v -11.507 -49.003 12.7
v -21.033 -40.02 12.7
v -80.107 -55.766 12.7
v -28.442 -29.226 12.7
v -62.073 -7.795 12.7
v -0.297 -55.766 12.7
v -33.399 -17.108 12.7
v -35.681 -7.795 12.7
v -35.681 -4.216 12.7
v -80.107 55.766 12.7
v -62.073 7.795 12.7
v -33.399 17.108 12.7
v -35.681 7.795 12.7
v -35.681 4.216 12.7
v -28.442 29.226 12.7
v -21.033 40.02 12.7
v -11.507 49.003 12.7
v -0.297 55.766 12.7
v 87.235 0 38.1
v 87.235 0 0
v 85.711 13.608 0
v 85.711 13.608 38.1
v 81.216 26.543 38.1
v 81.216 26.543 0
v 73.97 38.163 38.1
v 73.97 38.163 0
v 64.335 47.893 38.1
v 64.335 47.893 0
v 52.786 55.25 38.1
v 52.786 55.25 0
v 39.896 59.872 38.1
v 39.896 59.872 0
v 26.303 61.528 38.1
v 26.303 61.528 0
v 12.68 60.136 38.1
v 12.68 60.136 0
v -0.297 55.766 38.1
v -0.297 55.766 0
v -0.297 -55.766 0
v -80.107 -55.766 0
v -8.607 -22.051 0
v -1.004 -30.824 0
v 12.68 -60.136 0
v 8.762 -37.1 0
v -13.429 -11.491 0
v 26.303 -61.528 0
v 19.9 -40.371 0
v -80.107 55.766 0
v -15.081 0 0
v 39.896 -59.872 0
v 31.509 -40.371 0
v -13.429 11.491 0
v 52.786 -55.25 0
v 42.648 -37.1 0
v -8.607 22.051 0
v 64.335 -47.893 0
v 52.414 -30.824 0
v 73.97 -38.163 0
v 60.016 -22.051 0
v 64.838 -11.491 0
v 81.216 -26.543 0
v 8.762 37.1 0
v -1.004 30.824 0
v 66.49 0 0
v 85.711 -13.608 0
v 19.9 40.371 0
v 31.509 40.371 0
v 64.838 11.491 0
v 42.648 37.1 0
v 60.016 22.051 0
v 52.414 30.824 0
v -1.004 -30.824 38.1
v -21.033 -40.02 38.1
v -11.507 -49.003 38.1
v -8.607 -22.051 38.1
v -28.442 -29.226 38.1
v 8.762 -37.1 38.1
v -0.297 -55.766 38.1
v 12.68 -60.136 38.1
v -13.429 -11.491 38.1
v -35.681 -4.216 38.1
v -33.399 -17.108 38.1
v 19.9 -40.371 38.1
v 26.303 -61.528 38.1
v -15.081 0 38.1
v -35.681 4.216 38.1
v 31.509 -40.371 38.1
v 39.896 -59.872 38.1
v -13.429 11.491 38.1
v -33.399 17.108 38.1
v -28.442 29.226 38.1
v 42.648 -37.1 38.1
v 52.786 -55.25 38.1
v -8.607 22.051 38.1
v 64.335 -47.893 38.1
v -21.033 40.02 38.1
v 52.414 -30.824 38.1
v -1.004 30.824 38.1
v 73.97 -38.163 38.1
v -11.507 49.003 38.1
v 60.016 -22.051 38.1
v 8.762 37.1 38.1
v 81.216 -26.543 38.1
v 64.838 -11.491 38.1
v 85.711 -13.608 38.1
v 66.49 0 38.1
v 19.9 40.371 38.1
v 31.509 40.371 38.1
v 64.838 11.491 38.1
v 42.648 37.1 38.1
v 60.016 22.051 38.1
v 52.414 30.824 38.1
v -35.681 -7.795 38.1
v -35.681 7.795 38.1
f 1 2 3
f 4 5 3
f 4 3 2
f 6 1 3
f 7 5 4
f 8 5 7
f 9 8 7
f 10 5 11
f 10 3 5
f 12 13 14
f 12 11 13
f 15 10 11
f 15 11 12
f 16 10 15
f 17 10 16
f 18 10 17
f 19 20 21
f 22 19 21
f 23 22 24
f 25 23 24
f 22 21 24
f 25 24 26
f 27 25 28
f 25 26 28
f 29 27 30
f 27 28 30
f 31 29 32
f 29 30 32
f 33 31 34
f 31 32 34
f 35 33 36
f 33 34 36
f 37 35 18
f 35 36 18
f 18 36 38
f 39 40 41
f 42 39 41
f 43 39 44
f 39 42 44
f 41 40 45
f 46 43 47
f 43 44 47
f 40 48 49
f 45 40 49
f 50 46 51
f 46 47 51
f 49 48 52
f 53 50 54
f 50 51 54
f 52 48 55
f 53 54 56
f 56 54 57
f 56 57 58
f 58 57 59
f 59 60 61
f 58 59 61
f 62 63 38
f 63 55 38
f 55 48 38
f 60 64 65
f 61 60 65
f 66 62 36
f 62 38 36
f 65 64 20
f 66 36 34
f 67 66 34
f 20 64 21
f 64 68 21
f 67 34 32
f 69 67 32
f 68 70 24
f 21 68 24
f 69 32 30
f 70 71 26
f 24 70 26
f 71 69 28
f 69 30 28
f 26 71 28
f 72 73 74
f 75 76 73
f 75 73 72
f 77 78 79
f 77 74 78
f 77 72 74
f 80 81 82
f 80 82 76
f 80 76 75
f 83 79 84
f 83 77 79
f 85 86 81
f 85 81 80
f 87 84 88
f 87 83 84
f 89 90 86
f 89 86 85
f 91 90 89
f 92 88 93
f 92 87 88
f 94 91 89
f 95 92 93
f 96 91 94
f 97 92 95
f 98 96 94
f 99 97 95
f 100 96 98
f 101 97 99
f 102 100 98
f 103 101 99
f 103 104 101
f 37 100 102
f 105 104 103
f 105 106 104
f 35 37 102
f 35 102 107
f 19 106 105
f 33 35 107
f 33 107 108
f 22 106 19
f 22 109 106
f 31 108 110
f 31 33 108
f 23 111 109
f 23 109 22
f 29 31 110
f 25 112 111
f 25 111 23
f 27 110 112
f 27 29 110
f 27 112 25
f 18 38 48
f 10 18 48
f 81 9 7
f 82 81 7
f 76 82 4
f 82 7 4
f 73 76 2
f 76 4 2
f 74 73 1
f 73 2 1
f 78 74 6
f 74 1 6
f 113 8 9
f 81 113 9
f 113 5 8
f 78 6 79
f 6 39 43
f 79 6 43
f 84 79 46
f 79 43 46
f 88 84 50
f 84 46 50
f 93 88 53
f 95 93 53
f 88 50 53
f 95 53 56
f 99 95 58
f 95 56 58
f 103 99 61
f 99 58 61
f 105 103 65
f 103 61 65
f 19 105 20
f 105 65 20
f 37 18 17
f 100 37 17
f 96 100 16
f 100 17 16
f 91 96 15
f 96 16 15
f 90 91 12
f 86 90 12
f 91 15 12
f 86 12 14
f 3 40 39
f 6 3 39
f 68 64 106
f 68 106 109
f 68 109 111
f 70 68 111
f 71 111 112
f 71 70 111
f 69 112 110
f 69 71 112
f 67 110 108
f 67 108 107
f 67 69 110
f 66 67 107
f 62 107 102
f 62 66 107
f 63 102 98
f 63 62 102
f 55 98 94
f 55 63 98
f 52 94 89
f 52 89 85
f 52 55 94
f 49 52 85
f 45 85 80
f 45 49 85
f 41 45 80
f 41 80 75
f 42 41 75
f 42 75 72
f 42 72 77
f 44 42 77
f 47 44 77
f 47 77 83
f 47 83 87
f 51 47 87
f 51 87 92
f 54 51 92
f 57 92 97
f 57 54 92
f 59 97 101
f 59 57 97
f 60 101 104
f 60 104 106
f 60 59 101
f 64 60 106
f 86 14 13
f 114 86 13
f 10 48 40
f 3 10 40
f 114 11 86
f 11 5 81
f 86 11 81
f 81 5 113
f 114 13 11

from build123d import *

# Parameters (mm, degrees)
F1_DEPTH = 12.7
F0_R     = 40.785869
F2_DEPTH = 38.1
F4_DEPTH = 25.4
F6_DEPTH = 69.326828


with BuildPart() as f1:
    # F0 (on Top) → F1 (new body)
    with BuildSketch(Plane.XY):
        with BuildLine():
            Line((-0.29745, 55.766355), (-80.107197, 55.766355))
            Line((-80.107197, 55.766355), (-80.107197, -55.766355))
            Line((-80.107197, -55.766355), (-0.29745, -55.766355))
            ThreePointArc((-0.29745, -55.766355), (-35.825811, 0), (-0.29745, 55.766355))
        make_face()
    extrude(amount=F1_DEPTH)

    # F0 (on Top) → F2 (join)
    with BuildSketch(Plane.XY):
        with BuildLine():
            ThreePointArc((87.235052, 0), (58.765741, 51.893702), (-0.29745, 55.766355))
            ThreePointArc((-0.29745, 55.766355), (-35.825811, 0), (-0.29745, -55.766355))
            ThreePointArc((-0.29745, -55.766355), (58.765741, -51.893702), (87.235052, 0))
        make_face()
        with Locations((25.70462, 0)):
            Circle(F0_R, mode=Mode.SUBTRACT)
    extrude(amount=F2_DEPTH)

    # F3 (on face) → F4 (join)
    with BuildSketch(Plane.XY.offset(12.7)):
        with BuildLine():
            Line((-35.681184, 7.795396), (-62.072869, 7.795396))
            Line((-62.072869, 7.795396), (-62.072869, -7.795396))
            Line((-62.072869, -7.795396), (-35.681184, -7.795396))
            Line((-35.681184, -7.795396), (-35.681184, -4.216278))
            ThreePointArc((-35.681184, -4.216278), (-35.825811, 0), (-35.681184, 4.216278))
            Line((-35.681184, 4.216278), (-35.681184, 7.795396))
        make_face()
    extrude(amount=F4_DEPTH)

    # F5 (on face) → F6 (cut, through all)
    with BuildSketch(Plane.XZ.offset(7.795396)):
        Polygon((-62.072869, 38.1), (-62.072869, 12.7), (-35.681184, 38.1), align=None)
    extrude(amount=-F6_DEPTH, mode=Mode.SUBTRACT)


solid = f1.part
